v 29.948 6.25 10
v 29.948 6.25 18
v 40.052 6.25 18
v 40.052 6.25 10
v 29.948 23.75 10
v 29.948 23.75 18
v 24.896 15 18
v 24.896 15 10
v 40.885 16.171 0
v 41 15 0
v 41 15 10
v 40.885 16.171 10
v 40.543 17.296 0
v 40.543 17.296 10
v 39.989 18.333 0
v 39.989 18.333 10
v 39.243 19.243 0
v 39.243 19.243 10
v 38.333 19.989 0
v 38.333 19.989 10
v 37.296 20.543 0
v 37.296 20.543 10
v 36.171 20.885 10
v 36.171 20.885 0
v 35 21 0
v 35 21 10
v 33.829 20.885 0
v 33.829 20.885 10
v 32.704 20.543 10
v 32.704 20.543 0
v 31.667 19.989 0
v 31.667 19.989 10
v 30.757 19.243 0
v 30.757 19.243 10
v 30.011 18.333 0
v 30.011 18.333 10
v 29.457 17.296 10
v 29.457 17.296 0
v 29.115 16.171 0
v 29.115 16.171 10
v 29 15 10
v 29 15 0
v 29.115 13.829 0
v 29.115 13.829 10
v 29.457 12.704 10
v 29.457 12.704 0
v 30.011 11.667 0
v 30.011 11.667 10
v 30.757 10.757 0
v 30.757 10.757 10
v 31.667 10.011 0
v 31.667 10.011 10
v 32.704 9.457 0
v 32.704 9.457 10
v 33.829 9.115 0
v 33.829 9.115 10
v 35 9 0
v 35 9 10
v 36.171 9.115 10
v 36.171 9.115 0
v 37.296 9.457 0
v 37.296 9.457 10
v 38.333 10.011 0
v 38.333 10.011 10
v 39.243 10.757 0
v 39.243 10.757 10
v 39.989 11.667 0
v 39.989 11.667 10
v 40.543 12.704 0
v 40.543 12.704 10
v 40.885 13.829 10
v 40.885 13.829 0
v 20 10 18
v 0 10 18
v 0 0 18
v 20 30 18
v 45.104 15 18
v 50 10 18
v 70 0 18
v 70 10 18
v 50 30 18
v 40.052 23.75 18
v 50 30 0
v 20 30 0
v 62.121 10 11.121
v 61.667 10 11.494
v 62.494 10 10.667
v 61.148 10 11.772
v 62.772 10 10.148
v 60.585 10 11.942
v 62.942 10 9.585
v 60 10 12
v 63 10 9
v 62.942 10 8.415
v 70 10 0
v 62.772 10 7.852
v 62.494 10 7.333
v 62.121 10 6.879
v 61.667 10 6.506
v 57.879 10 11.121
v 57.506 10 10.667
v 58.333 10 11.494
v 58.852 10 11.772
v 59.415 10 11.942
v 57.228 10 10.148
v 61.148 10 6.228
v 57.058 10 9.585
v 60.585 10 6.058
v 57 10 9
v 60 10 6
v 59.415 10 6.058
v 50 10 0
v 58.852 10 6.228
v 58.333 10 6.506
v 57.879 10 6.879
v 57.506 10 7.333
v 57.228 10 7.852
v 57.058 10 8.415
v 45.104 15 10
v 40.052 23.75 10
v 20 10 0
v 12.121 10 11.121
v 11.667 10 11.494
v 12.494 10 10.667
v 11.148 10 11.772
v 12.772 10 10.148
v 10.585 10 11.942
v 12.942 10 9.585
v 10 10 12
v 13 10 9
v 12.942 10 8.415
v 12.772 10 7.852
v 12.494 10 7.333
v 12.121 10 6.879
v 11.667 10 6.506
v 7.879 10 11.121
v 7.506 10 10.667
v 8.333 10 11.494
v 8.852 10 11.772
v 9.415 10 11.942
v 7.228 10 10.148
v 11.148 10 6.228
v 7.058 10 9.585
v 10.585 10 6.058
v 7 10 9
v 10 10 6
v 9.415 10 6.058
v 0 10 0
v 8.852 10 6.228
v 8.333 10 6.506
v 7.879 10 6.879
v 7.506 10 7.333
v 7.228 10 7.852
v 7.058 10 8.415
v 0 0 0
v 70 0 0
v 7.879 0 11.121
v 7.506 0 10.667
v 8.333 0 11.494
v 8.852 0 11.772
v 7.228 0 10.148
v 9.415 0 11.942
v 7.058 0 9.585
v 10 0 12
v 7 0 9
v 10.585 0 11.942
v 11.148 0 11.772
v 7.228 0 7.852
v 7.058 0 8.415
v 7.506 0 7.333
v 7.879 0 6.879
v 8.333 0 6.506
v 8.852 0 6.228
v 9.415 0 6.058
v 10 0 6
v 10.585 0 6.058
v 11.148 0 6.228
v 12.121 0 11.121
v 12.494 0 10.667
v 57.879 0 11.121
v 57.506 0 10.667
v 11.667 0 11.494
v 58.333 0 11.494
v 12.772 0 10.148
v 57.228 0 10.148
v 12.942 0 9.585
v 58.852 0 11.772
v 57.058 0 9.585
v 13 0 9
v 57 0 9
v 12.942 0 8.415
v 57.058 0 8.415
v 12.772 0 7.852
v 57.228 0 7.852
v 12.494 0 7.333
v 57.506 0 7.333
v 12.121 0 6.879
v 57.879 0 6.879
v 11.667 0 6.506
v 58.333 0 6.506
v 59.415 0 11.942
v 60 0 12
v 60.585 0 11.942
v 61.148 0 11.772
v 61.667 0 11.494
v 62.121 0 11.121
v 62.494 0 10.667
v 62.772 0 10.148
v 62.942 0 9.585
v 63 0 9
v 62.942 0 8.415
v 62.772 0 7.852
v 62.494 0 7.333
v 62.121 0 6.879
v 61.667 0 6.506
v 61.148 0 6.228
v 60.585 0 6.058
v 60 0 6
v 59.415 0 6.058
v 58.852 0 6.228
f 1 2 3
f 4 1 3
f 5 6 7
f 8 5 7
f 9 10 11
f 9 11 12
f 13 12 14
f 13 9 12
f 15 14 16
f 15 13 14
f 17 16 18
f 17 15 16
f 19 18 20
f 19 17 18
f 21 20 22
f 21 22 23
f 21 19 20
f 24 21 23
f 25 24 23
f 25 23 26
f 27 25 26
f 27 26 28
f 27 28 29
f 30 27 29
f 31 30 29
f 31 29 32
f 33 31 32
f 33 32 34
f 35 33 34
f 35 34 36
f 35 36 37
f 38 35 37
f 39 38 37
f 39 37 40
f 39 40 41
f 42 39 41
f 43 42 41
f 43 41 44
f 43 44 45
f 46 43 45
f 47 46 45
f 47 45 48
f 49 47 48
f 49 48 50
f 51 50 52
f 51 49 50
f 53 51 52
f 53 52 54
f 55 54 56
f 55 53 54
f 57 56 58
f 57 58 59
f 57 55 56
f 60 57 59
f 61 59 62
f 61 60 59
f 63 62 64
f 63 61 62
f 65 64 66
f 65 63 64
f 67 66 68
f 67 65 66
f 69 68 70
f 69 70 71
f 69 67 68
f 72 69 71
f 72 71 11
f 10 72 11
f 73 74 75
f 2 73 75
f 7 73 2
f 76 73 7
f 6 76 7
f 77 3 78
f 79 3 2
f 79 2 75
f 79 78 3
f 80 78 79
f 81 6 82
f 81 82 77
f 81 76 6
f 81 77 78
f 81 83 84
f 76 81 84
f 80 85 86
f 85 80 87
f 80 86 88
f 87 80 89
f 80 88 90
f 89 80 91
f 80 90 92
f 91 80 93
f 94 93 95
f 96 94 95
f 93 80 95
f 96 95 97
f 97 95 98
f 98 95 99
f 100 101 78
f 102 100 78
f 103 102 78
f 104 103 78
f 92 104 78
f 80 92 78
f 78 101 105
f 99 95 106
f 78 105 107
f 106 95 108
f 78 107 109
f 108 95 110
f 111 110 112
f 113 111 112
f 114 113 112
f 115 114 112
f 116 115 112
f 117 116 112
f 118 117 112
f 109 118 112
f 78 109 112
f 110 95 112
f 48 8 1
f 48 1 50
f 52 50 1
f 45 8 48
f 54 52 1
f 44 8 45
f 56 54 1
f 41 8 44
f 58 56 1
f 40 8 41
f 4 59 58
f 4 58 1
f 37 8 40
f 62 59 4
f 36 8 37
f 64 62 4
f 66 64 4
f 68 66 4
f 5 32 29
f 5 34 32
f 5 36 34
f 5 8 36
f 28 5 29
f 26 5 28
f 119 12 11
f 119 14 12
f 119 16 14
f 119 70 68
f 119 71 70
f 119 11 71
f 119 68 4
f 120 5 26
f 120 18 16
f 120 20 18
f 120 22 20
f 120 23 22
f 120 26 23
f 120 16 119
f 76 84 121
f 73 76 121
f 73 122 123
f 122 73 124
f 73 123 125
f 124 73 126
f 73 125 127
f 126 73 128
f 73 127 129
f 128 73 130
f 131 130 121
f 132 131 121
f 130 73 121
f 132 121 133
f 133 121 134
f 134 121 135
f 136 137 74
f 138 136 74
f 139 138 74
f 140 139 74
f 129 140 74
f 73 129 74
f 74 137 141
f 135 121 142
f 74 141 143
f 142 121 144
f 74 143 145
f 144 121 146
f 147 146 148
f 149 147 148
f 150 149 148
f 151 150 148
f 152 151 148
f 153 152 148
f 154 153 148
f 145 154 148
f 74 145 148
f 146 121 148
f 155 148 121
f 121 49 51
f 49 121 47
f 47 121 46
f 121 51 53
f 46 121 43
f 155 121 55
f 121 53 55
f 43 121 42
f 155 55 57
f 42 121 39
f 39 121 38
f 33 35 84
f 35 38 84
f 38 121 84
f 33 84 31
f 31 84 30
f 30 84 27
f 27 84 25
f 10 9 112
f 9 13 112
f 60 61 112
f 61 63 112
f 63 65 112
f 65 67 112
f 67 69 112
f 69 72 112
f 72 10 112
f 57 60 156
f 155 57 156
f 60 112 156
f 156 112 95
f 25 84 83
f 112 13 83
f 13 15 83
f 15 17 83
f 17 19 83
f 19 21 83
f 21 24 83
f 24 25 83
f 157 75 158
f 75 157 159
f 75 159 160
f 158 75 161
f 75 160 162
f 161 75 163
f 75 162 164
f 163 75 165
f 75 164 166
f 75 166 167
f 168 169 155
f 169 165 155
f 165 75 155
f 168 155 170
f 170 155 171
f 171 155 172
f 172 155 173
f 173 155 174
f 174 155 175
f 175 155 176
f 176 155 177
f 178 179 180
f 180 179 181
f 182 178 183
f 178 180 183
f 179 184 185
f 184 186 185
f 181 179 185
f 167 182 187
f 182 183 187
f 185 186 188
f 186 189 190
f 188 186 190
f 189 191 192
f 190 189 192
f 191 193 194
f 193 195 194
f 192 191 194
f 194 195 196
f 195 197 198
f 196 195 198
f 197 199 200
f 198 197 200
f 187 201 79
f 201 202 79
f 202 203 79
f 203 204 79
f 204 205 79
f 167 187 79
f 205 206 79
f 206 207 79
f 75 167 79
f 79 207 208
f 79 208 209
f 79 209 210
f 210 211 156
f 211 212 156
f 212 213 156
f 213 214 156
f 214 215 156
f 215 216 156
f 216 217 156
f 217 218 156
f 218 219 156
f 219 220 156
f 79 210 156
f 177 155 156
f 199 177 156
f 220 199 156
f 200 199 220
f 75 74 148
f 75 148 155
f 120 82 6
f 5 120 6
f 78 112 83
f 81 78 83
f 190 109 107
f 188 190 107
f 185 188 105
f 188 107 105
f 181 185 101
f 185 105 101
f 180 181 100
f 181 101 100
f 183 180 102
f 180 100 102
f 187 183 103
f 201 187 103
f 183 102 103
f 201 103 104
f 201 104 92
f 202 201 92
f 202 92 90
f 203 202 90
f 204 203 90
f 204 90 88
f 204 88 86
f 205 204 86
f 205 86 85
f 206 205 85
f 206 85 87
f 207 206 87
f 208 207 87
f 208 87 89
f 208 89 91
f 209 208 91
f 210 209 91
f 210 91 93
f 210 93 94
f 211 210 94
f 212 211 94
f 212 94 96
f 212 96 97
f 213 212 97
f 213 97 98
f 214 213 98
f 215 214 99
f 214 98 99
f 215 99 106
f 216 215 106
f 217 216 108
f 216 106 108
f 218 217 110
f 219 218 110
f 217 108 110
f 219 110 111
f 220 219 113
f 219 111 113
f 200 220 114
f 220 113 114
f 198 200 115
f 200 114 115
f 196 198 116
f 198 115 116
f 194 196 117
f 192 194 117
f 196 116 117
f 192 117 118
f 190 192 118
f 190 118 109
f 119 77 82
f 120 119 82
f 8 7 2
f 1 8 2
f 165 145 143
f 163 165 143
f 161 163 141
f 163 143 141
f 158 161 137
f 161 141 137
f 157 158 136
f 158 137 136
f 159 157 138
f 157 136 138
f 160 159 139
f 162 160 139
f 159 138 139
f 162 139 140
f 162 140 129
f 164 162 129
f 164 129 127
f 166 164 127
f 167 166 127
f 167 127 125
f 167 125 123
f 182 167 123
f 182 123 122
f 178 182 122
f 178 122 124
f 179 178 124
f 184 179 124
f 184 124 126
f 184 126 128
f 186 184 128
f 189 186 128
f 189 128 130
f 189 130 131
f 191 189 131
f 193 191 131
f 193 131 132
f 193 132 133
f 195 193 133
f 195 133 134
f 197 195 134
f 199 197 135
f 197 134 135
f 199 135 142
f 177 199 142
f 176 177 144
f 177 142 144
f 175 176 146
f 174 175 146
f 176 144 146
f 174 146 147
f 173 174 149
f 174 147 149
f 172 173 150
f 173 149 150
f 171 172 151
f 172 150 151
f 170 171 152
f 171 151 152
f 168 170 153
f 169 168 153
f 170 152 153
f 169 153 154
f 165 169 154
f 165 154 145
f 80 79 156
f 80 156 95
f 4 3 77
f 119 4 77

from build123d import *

# Parameters (mm, degrees)
F0_R     = 6
F1_DEPTH = 18
F2_R     = 6
F3_DEPTH = 8
F4_R     = 3
F5_DEPTH = 25


with BuildPart() as f1:
    # F0 (on Top) → F1 (new body)
    with BuildSketch(Plane.XY):
        Polygon((0, 10), (0, 0), (70, 0), (70, 10), (50, 10), (50, 30), (20, 30), (20, 10), align=None)
        with Locations((35, 15)):
            Circle(F0_R, mode=Mode.SUBTRACT)
    extrude(amount=F1_DEPTH)

    # F2 (on face) → F3 (cut)
    with BuildSketch(Plane.XY.offset(18)):
        Polygon((40.051815, 23.75), (29.948185, 23.75), (24.89637, 15), (29.948185, 6.25), (40.051815, 6.25), (45.10363, 15), align=None)
        with Locations((35, 15)):
            Circle(F2_R, mode=Mode.SUBTRACT)
    extrude(amount=-F3_DEPTH, mode=Mode.SUBTRACT)

    # F4 (on face) → F5 (cut)
    with BuildSketch(Plane(origin=(0, 10, 0), x_dir=(-1, 0, 0), z_dir=(0, 1, 0))):
        with Locations((-60, 9)):
            Circle(F4_R)
        with Locations((-10, 9)):
            Circle(F4_R)
    extrude(amount=-F5_DEPTH, mode=Mode.SUBTRACT)


solid = f1.part
